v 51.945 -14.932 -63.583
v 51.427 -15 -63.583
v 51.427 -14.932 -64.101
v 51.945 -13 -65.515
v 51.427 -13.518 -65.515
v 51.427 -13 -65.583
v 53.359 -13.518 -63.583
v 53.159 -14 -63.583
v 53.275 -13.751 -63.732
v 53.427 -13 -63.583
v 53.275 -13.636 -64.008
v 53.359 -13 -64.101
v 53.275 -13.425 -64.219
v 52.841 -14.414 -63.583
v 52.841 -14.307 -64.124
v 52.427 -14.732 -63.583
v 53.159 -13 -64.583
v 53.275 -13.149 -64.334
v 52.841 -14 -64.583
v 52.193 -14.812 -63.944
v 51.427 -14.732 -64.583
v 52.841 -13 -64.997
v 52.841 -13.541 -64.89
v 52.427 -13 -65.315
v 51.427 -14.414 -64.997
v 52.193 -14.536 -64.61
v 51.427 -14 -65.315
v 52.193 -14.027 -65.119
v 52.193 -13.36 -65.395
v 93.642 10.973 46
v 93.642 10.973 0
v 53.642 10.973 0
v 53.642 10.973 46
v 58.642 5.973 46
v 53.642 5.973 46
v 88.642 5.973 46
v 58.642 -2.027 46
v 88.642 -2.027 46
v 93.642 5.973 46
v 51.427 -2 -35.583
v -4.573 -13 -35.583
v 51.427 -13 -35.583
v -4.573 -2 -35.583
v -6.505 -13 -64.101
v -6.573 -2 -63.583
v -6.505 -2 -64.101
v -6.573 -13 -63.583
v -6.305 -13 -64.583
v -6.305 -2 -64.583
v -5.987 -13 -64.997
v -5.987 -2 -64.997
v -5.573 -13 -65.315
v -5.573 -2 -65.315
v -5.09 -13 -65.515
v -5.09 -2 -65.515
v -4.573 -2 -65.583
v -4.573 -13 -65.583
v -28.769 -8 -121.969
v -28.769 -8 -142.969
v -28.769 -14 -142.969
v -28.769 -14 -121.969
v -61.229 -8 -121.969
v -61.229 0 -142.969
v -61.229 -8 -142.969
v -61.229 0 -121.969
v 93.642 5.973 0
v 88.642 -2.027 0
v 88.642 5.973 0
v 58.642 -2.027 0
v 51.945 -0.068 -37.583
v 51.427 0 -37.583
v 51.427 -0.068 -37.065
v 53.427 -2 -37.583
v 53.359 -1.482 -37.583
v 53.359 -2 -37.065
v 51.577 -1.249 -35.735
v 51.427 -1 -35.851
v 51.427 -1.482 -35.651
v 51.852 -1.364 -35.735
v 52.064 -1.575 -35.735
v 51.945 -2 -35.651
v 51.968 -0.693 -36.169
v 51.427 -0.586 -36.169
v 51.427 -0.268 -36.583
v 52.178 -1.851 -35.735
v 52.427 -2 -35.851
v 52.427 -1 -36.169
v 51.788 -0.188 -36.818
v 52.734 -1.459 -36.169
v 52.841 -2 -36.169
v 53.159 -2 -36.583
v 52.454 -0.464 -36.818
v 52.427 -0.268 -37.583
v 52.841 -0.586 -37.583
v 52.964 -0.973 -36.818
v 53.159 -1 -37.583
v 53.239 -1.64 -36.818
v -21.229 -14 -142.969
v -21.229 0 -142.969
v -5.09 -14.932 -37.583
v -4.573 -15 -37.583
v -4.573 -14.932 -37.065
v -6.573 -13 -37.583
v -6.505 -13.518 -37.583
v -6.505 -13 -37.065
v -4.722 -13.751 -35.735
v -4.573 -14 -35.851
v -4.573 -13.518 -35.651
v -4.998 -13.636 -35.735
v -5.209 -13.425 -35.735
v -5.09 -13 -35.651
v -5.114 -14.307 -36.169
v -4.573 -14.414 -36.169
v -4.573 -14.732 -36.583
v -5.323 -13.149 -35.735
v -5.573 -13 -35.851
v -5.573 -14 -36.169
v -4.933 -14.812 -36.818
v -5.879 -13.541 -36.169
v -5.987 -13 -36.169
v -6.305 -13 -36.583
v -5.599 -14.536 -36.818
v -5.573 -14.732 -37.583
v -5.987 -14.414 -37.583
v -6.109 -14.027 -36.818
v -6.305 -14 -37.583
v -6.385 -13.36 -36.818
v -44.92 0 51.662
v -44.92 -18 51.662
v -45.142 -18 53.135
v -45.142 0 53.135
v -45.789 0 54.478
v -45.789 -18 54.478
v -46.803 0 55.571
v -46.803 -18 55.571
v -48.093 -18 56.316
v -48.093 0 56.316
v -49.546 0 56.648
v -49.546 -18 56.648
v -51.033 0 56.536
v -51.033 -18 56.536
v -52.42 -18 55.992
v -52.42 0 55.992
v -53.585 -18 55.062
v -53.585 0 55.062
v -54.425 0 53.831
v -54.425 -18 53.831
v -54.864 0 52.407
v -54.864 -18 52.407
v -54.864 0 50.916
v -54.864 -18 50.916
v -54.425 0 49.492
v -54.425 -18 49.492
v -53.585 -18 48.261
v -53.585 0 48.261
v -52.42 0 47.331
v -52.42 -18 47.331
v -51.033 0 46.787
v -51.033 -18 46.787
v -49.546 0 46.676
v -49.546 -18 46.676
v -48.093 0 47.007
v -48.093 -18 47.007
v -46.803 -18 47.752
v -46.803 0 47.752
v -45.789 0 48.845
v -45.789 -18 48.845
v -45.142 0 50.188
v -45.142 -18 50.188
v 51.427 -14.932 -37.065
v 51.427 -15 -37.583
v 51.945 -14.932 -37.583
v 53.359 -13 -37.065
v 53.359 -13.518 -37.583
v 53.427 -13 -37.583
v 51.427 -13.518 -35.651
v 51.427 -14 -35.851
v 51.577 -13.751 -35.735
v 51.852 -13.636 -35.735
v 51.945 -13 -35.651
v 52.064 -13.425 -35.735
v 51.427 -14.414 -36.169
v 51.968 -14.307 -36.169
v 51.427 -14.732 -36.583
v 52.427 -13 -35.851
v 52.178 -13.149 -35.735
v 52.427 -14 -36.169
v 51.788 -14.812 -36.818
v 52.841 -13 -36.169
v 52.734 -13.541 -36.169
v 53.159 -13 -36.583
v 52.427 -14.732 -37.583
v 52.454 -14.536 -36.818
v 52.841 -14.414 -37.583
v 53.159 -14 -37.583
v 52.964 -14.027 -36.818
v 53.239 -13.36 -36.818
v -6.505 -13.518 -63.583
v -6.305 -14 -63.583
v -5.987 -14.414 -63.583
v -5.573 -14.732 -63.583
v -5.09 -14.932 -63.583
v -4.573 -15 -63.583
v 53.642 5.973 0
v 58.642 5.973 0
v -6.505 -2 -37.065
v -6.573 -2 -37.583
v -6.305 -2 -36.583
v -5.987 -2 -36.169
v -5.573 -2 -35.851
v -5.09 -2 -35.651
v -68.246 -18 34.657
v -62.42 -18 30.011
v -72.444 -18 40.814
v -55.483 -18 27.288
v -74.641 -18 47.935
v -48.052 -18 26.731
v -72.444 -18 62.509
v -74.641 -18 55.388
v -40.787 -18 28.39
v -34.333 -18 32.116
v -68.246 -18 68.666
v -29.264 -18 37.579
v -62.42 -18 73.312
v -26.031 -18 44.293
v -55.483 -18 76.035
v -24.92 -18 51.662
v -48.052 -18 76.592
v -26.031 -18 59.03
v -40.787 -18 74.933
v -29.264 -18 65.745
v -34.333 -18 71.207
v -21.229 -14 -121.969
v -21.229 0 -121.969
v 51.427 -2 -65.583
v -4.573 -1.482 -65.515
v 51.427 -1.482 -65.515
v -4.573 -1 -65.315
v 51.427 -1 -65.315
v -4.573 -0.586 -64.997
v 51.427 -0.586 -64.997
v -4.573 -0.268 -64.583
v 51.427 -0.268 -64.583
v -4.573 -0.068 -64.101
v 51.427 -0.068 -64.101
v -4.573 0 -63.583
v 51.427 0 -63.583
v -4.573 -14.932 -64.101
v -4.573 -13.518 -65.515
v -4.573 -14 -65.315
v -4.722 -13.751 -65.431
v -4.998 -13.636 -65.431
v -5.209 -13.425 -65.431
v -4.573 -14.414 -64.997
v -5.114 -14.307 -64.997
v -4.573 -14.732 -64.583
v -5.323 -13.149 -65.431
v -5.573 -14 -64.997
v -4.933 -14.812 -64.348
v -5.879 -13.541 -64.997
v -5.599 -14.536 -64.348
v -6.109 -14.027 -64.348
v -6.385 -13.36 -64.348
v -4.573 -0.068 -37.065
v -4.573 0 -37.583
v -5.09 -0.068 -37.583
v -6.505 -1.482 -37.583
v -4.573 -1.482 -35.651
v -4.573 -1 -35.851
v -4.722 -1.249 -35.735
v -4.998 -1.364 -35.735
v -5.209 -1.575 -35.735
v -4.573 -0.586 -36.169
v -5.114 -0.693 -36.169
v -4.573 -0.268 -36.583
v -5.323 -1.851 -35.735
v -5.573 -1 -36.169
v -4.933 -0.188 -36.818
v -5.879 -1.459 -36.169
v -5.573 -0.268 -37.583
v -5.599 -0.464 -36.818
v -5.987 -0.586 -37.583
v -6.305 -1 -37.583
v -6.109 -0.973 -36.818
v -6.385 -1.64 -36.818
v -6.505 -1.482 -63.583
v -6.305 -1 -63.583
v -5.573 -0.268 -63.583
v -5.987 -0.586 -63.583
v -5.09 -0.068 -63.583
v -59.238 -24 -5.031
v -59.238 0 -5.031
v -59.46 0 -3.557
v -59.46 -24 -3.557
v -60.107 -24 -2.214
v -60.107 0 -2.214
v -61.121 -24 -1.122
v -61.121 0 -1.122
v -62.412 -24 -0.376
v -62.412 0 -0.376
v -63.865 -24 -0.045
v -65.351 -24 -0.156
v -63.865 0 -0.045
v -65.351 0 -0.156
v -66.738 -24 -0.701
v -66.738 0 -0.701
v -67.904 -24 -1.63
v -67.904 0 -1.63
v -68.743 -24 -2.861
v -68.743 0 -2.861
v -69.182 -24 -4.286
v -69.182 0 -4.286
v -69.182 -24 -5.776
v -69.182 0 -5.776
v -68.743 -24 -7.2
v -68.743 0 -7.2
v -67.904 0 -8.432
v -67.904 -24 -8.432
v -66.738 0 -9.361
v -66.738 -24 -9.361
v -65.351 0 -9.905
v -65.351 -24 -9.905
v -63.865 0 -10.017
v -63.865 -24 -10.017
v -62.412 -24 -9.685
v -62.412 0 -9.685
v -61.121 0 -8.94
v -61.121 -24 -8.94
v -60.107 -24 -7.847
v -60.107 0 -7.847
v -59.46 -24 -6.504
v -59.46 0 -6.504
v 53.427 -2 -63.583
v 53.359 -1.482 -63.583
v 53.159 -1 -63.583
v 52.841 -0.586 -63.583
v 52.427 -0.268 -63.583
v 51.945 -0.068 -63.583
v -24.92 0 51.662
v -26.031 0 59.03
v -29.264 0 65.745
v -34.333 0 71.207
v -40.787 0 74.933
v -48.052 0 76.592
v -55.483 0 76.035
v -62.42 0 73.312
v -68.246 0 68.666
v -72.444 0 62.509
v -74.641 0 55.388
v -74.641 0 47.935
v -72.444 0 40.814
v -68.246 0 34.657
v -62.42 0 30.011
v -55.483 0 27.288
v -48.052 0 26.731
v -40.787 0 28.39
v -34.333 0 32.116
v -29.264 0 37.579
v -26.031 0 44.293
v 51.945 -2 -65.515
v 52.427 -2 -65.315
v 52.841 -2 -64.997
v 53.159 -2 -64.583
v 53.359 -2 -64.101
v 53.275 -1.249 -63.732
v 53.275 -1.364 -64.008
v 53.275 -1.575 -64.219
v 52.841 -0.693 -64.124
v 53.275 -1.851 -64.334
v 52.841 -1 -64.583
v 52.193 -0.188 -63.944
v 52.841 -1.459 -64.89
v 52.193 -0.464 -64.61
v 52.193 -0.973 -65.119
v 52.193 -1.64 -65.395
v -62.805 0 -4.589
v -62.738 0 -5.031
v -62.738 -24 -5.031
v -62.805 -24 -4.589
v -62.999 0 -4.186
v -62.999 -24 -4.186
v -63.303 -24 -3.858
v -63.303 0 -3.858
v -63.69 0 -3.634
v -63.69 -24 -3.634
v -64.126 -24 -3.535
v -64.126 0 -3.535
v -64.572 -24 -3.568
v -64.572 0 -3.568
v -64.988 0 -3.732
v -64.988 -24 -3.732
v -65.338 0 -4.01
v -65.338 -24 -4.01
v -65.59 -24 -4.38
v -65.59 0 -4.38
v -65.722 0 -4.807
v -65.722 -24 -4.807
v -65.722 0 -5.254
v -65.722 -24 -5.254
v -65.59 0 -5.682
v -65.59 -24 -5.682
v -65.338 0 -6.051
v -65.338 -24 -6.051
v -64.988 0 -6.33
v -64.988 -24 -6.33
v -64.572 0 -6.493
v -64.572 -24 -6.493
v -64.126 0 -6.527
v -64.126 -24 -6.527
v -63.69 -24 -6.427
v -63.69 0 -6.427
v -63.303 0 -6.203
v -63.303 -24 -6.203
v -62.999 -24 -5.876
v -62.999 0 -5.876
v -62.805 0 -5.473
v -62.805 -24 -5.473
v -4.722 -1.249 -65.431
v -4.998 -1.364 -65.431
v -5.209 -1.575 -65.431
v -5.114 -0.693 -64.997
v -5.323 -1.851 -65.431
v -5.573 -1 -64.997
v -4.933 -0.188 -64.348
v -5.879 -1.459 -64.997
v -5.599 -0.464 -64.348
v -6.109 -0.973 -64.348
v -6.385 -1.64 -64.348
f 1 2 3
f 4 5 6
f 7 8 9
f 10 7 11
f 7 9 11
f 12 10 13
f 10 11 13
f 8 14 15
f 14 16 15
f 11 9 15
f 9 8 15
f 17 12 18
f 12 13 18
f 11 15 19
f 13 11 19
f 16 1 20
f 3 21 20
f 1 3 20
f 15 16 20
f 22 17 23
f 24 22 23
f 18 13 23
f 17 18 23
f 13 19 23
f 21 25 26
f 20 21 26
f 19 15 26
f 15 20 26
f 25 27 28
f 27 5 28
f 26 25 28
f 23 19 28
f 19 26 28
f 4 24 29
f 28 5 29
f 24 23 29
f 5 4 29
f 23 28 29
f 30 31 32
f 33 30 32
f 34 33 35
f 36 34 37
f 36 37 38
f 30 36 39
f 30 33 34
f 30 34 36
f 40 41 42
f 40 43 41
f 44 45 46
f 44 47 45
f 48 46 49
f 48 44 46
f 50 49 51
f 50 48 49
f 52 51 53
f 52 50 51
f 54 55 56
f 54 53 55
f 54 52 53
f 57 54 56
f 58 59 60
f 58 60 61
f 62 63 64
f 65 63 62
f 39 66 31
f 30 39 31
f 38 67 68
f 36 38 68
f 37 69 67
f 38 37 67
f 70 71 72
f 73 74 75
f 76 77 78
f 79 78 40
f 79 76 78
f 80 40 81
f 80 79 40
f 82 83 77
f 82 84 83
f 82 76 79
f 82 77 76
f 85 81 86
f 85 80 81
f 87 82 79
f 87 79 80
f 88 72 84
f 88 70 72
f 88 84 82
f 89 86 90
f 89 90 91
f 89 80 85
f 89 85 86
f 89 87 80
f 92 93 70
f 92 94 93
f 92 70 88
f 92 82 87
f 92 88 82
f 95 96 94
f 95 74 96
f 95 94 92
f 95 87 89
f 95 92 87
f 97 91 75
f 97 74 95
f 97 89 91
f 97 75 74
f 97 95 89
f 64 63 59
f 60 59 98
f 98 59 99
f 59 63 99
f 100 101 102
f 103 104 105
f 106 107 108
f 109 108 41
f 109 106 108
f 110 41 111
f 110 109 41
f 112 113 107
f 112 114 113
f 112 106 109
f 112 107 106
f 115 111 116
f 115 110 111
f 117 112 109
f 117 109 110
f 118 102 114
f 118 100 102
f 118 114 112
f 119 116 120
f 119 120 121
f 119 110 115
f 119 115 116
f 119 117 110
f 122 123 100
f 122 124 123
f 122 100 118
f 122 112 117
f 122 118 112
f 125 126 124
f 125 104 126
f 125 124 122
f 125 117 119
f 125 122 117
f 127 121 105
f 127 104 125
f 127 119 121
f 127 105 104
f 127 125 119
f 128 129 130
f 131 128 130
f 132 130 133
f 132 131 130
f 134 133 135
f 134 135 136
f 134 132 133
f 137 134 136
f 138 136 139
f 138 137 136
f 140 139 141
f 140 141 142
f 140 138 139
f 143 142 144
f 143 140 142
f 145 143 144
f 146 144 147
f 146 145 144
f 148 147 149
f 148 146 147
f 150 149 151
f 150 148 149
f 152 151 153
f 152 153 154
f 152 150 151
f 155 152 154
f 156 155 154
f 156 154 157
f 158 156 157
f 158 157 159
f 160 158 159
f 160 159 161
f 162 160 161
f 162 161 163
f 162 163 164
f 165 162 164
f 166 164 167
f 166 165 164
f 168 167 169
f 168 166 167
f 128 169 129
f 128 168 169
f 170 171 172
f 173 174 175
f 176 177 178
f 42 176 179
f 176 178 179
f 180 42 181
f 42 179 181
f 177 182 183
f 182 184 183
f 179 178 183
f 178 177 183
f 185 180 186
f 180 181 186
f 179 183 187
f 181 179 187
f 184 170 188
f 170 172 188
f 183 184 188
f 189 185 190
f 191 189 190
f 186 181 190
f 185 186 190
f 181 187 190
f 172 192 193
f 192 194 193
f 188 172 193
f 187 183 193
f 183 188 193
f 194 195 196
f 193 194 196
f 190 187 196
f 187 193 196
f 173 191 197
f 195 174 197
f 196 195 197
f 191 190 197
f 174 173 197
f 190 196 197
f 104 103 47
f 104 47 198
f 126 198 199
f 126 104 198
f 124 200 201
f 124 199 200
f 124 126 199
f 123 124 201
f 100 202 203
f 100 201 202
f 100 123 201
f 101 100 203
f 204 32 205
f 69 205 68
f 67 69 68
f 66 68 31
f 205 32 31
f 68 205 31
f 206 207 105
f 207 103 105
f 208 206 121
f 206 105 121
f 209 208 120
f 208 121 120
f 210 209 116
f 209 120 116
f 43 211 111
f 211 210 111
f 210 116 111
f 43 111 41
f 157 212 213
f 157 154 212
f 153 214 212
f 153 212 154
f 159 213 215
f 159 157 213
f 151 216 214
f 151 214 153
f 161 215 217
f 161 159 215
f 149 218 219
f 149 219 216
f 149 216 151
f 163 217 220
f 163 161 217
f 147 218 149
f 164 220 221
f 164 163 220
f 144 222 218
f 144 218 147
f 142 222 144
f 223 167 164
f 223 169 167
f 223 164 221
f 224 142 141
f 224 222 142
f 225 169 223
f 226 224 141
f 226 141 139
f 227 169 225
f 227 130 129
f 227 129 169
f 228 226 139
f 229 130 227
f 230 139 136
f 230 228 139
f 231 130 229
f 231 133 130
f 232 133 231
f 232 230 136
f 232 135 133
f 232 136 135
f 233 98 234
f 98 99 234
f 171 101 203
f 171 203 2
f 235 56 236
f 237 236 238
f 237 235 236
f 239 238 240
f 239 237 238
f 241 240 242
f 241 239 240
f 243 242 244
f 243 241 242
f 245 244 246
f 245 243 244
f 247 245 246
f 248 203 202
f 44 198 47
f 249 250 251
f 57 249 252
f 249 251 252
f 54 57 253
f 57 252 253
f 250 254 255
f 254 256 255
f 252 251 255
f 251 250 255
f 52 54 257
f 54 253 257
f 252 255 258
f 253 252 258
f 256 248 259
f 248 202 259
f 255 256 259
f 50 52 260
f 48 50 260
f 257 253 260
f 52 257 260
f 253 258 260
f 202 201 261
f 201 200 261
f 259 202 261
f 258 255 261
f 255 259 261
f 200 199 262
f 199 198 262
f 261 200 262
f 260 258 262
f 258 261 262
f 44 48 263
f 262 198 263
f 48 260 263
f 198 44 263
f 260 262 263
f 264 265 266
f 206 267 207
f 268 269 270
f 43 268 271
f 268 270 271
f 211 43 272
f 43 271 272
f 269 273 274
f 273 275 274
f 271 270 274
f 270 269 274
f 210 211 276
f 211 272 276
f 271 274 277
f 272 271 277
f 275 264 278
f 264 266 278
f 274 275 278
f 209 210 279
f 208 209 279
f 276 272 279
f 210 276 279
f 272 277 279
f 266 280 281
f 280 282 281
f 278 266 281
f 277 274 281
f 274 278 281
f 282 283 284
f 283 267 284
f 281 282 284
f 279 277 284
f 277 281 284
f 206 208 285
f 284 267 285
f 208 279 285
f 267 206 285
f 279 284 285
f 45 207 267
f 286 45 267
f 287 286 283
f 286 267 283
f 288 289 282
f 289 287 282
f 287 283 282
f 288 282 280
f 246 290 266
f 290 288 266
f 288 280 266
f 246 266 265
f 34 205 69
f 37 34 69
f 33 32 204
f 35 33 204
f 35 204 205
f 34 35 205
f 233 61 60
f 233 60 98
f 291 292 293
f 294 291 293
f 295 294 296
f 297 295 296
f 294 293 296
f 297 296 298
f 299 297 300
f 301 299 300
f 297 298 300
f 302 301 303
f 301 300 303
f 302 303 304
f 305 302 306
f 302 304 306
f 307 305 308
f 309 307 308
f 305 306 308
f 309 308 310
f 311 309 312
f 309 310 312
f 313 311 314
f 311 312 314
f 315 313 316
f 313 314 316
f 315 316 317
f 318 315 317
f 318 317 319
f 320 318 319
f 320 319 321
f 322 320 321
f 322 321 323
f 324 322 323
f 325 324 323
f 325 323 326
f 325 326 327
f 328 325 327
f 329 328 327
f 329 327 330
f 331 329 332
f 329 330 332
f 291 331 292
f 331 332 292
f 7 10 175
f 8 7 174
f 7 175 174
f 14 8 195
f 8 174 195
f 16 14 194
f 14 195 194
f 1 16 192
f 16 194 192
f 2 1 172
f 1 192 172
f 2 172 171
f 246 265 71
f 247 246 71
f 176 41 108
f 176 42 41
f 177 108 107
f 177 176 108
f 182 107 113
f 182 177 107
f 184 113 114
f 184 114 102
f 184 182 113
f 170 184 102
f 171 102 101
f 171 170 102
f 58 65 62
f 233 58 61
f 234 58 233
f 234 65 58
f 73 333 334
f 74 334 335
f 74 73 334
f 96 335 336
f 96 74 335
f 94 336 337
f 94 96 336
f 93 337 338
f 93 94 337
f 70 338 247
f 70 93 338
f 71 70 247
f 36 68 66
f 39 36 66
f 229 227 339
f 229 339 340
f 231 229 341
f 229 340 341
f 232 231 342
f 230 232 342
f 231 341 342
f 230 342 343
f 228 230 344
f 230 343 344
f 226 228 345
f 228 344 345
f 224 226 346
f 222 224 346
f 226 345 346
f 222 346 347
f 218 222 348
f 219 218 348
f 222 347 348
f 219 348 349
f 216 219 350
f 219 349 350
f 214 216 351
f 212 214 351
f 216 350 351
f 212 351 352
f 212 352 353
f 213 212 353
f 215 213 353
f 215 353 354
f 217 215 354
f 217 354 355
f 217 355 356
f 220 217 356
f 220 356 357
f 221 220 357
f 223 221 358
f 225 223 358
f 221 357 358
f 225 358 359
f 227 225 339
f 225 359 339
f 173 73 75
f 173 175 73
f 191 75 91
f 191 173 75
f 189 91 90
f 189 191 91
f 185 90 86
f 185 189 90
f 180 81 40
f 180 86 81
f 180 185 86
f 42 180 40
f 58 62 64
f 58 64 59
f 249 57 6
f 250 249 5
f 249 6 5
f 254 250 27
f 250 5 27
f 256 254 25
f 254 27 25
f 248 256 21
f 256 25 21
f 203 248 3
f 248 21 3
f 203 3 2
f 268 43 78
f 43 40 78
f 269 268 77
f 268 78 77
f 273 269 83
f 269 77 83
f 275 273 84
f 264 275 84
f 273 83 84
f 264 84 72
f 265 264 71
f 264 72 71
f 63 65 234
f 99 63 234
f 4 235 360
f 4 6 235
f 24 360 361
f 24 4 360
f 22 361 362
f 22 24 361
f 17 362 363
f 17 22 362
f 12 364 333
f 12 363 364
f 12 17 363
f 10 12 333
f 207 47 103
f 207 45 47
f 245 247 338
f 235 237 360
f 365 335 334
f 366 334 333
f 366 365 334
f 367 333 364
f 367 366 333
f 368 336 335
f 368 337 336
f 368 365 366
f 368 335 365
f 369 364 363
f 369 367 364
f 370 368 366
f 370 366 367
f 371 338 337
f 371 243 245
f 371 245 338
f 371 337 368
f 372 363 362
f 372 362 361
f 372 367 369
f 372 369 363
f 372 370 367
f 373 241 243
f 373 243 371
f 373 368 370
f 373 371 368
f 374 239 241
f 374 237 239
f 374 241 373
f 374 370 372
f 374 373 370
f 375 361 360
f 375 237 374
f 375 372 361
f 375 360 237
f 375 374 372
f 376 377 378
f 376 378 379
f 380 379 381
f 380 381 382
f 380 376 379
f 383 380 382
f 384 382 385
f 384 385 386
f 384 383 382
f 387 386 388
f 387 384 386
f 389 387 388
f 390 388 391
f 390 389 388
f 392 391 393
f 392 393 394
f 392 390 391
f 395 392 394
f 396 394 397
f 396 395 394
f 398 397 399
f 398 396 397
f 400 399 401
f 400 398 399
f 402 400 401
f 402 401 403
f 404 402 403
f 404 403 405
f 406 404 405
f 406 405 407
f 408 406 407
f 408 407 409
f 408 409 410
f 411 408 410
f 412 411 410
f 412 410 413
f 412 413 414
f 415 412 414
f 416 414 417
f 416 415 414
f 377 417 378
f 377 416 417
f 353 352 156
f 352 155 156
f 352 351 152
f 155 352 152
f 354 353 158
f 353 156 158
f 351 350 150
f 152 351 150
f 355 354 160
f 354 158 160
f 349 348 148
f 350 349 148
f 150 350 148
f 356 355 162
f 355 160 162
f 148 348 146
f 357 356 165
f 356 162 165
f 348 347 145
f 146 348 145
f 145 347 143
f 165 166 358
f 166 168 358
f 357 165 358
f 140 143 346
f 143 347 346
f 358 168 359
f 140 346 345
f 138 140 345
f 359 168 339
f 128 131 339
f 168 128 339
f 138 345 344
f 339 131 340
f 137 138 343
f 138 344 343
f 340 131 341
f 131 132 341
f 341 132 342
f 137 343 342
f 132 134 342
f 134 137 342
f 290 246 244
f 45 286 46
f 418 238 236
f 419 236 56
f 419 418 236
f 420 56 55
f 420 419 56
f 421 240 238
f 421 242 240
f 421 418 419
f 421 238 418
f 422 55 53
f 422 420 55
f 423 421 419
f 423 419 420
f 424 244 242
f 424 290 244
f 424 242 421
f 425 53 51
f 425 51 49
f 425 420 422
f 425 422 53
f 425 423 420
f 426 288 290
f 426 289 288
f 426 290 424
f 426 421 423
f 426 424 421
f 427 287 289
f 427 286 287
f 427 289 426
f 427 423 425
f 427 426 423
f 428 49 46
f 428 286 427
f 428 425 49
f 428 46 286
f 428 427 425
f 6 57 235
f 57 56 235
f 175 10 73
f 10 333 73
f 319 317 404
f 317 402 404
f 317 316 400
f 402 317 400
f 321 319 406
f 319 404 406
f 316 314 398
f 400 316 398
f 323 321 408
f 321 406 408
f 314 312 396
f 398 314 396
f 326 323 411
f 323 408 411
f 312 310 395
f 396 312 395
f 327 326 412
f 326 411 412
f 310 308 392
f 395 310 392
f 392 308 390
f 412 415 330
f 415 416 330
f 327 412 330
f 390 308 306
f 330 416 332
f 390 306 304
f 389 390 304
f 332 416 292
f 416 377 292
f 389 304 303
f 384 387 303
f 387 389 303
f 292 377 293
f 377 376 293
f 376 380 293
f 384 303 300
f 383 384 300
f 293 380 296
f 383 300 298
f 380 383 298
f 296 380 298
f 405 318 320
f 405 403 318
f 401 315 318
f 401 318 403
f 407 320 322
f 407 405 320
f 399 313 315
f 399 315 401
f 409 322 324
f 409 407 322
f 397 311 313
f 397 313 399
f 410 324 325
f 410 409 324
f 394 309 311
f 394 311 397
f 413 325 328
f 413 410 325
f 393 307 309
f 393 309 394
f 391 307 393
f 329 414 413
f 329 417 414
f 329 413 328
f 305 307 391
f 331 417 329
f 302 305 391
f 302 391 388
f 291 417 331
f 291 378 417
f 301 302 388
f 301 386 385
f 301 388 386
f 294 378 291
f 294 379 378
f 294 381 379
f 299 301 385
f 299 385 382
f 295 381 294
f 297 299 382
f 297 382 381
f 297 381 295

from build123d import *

# Parameters (mm, degrees)
F0_R      = 25
F0_R_2    = 5
F1_DEPTH  = 18
F2_R      = 5
F2_R_2    = 1.5
F3_DEPTH  = 24
F4_W      = 60
F4_H      = 30
F5_DEPTH  = 15
F6_R      = 2
F7_W      = 40
F7_H      = 21
F8_DEPTH  = 8
F9_W      = 7.540168
F9_H      = 21
F10_DEPTH = 6
F12_DEPTH = 46


with BuildPart() as f1:
    # F0 (on Front) → F1 (new body)
    with BuildSketch(Plane.XZ):
        with Locations((-49.920149, 51.661547)):
            Circle(F0_R)
        with Locations((-49.920149, 51.661547)):
            Circle(F0_R_2, mode=Mode.SUBTRACT)
    extrude(amount=F1_DEPTH)


with BuildPart() as f3:
    # F2 (on Front) → F3 (new body)
    with BuildSketch(Plane.XZ):
        with Locations((-64.238332, -5.030713)):
            Circle(F2_R)
        with Locations((-64.238332, -5.030713)):
            Circle(F2_R_2, mode=Mode.SUBTRACT)
    extrude(amount=F3_DEPTH)


with BuildPart() as f5:
    # F4 (on Front) → F5 (new body)
    with BuildSketch(Plane.XZ):
        with Locations((23.427234, -50.583077)):
            Rectangle(F4_W, F4_H)
    extrude(amount=F5_DEPTH)

    # F6
    f6_edges = [f5.edges().sort_by_distance(p)[0] for p in [
        (-6.572766, -15, -50.583077),
        (23.427234, -15, -65.583077),
        (53.427234, -15, -50.583077),
        (23.427234, -15, -35.583077),
        (-6.572766, 0, -50.583077),
        (23.427234, 0, -65.583077),
        (53.427234, 0, -50.583077),
        (23.427234, 0, -35.583077),
        (-6.572766, -7.5, -65.583077),
        (53.427234, -7.5, -65.583077),
        (53.427234, -7.5, -35.583077),
        (-6.572766, -7.5, -35.583077),
    ]]
    fillet(f6_edges, radius=F6_R)


with BuildPart() as f8:
    # F7 (on Front) → F8 (new body)
    with BuildSketch(Plane.XZ):
        with Locations((-41.229068, -132.46946)):
            Rectangle(F7_W, F7_H)
    extrude(amount=F8_DEPTH)

    # F9 (on face) → F10 (join)
    with BuildSketch(Plane.XZ.offset(8)):
        with Locations((-24.999152, -132.46946)):
            Rectangle(F9_W, F9_H)
    extrude(amount=F10_DEPTH)


with BuildPart() as f12:
    # F11 (on Top) → F12 (new body)
    with BuildSketch(Plane.XY):
        Polygon((93.64194, 10.973271), (53.64194, 10.973271), (53.64194, 5.973271), (58.64194, 5.973271), (58.64194, -2.026729), (88.64194, -2.026729), (88.64194, 5.973271), (93.64194, 5.973271), align=None)
    extrude(amount=F12_DEPTH)


solid = Compound([f1.part, f3.part, f5.part, f8.part, f12.part])
